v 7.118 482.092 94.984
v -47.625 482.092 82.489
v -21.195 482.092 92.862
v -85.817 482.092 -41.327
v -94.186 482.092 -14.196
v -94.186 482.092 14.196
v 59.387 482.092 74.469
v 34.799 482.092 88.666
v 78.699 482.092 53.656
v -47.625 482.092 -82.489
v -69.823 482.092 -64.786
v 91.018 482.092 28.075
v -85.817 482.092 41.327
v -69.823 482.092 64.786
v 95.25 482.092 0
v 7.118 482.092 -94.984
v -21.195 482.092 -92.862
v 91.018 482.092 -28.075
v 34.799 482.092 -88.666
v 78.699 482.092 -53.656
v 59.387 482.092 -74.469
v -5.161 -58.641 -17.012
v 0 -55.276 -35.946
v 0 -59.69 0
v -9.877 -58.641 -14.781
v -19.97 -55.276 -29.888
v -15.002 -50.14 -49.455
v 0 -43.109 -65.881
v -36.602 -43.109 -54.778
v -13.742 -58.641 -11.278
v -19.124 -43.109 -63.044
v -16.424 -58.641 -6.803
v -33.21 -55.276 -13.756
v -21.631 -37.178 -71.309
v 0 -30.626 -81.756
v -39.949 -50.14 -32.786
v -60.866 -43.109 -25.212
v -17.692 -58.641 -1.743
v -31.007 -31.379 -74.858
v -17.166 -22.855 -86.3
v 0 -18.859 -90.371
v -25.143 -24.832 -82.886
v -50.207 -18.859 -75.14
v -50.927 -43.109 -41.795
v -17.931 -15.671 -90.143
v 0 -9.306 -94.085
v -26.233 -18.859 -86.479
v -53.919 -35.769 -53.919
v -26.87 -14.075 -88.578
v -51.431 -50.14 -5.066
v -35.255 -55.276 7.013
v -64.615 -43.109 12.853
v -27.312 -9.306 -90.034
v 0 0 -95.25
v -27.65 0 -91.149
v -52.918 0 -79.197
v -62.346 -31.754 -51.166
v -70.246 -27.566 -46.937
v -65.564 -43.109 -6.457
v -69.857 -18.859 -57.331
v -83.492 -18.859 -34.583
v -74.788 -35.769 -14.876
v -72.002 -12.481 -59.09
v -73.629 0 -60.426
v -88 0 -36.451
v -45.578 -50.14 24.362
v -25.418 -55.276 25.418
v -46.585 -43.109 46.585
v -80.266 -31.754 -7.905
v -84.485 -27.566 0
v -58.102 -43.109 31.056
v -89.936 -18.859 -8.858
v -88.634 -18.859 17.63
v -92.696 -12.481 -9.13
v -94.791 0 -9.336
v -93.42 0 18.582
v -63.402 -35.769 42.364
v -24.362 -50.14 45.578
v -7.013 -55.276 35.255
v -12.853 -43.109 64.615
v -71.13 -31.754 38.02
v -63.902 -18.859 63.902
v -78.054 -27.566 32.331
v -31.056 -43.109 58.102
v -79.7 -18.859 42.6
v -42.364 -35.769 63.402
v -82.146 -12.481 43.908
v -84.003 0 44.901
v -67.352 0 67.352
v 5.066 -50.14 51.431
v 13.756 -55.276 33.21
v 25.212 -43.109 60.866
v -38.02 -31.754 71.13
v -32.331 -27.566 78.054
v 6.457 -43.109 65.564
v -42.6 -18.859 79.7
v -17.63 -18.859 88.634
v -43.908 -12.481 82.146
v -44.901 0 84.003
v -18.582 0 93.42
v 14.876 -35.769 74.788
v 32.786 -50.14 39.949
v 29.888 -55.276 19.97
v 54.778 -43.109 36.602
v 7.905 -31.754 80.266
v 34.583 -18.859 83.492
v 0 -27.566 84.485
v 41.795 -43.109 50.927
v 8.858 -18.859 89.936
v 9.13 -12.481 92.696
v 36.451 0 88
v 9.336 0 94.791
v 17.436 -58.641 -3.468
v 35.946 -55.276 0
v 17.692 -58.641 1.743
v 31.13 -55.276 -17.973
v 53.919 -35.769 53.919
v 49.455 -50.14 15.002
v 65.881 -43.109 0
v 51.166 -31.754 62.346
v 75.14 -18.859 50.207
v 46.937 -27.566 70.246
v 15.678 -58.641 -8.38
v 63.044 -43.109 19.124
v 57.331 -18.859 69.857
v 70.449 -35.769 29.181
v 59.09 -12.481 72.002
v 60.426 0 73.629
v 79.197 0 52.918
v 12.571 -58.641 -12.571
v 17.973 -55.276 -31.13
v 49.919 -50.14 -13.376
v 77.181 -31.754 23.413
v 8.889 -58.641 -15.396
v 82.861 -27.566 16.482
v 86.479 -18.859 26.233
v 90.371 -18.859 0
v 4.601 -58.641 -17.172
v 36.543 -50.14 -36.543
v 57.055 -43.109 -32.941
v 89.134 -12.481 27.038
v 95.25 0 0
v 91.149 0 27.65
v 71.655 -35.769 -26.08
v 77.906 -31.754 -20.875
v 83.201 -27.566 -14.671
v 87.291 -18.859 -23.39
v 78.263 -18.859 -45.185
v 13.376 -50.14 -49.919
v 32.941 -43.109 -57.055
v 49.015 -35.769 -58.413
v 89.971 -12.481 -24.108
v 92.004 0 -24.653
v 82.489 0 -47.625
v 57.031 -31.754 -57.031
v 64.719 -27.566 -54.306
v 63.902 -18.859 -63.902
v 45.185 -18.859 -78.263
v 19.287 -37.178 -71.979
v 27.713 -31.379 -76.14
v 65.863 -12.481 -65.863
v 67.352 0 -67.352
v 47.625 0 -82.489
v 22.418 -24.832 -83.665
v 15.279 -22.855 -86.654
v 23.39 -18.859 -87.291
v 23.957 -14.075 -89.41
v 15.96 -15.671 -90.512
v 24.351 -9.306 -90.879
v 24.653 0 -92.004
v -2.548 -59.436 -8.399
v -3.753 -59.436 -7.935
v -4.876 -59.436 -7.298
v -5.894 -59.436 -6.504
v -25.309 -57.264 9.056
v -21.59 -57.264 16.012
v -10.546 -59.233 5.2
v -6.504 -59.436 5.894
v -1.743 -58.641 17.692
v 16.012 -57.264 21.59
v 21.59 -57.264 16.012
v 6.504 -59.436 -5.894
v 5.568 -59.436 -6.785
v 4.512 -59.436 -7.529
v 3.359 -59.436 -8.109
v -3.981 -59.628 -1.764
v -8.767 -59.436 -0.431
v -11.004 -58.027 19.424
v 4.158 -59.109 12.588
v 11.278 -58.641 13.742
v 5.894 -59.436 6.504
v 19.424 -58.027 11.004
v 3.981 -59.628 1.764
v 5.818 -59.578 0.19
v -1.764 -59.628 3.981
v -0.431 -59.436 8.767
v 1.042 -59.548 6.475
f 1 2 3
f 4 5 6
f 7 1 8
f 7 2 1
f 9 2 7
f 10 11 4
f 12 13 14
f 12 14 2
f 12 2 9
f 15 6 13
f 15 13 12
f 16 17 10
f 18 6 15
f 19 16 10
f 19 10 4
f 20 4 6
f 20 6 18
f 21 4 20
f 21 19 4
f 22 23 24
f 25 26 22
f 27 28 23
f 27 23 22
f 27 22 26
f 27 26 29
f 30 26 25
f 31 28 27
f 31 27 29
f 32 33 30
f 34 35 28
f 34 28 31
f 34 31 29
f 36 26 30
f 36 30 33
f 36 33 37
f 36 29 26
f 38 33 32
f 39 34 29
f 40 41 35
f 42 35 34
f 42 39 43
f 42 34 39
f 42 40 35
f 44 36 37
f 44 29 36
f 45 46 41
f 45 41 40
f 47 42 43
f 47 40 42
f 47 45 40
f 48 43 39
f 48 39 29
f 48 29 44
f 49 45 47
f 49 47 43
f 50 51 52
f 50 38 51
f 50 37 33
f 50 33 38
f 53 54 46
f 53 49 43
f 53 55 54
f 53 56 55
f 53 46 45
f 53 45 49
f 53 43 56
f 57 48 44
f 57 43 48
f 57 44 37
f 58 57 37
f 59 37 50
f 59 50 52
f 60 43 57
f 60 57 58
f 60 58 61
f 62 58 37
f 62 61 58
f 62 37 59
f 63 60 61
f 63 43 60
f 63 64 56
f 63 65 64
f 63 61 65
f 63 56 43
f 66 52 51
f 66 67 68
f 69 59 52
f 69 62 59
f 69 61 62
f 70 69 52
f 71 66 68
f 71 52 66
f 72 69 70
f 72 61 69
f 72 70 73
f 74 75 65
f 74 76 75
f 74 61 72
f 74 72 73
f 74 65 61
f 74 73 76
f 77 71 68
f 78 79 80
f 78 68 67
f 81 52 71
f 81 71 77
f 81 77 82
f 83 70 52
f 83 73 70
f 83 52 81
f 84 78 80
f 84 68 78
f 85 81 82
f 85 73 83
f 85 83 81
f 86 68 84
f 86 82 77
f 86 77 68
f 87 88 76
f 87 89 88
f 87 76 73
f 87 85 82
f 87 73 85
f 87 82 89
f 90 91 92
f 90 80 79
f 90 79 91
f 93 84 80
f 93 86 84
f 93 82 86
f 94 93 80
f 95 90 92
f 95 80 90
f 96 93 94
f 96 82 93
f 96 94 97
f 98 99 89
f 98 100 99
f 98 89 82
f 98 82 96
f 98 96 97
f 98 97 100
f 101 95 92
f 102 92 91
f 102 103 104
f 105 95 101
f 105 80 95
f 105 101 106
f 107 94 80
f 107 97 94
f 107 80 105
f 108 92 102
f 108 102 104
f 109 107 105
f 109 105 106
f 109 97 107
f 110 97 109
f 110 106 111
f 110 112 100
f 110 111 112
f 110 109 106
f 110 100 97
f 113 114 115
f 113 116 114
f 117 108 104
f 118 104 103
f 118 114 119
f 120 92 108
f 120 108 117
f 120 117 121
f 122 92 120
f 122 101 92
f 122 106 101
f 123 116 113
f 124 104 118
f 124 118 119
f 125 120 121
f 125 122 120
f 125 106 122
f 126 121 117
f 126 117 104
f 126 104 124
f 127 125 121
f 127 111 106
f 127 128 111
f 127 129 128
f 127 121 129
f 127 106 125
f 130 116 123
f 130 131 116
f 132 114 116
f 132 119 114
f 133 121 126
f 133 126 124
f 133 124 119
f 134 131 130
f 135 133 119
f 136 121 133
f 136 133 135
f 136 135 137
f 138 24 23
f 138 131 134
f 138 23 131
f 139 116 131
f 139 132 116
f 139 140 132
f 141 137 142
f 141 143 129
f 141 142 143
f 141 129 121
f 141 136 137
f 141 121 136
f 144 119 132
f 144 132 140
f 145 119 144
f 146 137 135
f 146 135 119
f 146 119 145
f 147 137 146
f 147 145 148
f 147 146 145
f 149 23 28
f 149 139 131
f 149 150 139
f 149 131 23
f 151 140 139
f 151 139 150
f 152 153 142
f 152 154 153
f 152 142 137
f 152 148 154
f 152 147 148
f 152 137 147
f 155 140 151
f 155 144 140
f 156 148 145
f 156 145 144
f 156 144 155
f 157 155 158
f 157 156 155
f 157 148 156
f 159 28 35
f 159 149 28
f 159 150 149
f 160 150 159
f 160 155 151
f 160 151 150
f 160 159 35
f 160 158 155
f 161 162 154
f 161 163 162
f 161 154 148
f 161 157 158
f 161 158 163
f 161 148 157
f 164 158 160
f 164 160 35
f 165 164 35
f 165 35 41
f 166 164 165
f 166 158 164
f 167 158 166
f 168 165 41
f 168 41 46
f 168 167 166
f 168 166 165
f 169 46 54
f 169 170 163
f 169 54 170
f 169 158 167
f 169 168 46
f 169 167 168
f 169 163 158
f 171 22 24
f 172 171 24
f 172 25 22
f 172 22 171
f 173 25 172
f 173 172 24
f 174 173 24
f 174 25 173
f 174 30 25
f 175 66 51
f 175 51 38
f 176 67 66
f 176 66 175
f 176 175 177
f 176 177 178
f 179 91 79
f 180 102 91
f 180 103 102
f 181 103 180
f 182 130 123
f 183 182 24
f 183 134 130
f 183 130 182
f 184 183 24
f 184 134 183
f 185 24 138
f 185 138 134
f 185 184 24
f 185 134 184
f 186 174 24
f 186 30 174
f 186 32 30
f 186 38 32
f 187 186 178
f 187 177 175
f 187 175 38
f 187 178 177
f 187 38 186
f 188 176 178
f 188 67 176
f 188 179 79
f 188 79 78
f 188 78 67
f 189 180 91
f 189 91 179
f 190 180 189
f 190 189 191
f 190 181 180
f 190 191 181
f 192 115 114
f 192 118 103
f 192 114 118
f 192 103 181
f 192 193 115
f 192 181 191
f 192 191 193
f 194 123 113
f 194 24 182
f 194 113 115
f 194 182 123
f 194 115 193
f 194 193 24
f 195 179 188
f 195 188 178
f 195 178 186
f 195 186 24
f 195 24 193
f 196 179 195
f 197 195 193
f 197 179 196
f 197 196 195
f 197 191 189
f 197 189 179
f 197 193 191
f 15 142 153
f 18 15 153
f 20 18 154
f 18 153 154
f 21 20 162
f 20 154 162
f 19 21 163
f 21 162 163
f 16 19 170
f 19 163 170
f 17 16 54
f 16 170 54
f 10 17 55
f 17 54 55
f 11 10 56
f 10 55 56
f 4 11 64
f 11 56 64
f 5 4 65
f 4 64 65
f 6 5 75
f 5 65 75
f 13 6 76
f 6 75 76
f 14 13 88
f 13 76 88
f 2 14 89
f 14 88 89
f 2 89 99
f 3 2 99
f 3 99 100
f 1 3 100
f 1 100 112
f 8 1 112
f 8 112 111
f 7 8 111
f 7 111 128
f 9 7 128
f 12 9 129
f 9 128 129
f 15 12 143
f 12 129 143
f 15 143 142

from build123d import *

# Parameters (mm, degrees)
SKETCH1_R                = 95.25
BOSS_EXTRUDE1_DEPTH      = 482.6
SKETCH4_R                = 95.25
F_7_PERCENT_ULLAGE_DEPTH = 62.484


with BuildPart() as part:
    # Sketch1 → Boss-Extrude1 (new body)
    with BuildSketch(Plane(origin=(0, 0, 0), x_dir=(1, 0, 0), z_dir=(0, 1, 0))):
        Circle(SKETCH1_R)
    extrude(amount=BOSS_EXTRUDE1_DEPTH)

    # Sketch2 → Revolve1 (revolve)
    with BuildSketch(Plane(origin=(0, 0, 0), x_dir=(0, 0, -1), z_dir=(1, 0, 0))):
        with BuildLine():
            Line((0, 544.576), (0, 482.6))
            Line((0, 482.6), (95.25, 482.6))
            add(Edge.make_bspline(
                [(95.25, 482.6), (95.25, 544.576), (0, 544.576)],
                knots=[0, 0, 0, 1.570796327, 1.570796327, 1.570796327], degree=2, weights=[1, 0.707106781, 1]))
        make_face()
    revolve(axis=Axis((0, 544.576, 0), (0, -1, 0)))

    # Sketch3 → Revolve2 (revolve)
    with BuildSketch(Plane(origin=(0, 0, 0), x_dir=(0, 0, -1), z_dir=(1, 0, 0))):
        with BuildLine():
            Line((0, -59.69), (0, 0))
            Line((0, 0), (95.25, 0))
            add(Edge.make_bspline(
                [(0, -59.69), (95.25, -59.69), (95.25, 0)],
                knots=[4.71238898, 4.71238898, 4.71238898, 6.283185307, 6.283185307, 6.283185307], degree=2, weights=[1, 0.707106781, 1]))
        make_face()
    revolve(axis=Axis((0, -59.69, 0), (0, 1, 0)))

    # Sketch4 → 7 Percent Ullage (cut)
    with BuildSketch(Plane(origin=(0, 544.576, 0), x_dir=(1, 0, 0), z_dir=(0, 1, 0))):
        Circle(SKETCH4_R)
    extrude(amount=-F_7_PERCENT_ULLAGE_DEPTH, mode=Mode.SUBTRACT)


solid = part.part
